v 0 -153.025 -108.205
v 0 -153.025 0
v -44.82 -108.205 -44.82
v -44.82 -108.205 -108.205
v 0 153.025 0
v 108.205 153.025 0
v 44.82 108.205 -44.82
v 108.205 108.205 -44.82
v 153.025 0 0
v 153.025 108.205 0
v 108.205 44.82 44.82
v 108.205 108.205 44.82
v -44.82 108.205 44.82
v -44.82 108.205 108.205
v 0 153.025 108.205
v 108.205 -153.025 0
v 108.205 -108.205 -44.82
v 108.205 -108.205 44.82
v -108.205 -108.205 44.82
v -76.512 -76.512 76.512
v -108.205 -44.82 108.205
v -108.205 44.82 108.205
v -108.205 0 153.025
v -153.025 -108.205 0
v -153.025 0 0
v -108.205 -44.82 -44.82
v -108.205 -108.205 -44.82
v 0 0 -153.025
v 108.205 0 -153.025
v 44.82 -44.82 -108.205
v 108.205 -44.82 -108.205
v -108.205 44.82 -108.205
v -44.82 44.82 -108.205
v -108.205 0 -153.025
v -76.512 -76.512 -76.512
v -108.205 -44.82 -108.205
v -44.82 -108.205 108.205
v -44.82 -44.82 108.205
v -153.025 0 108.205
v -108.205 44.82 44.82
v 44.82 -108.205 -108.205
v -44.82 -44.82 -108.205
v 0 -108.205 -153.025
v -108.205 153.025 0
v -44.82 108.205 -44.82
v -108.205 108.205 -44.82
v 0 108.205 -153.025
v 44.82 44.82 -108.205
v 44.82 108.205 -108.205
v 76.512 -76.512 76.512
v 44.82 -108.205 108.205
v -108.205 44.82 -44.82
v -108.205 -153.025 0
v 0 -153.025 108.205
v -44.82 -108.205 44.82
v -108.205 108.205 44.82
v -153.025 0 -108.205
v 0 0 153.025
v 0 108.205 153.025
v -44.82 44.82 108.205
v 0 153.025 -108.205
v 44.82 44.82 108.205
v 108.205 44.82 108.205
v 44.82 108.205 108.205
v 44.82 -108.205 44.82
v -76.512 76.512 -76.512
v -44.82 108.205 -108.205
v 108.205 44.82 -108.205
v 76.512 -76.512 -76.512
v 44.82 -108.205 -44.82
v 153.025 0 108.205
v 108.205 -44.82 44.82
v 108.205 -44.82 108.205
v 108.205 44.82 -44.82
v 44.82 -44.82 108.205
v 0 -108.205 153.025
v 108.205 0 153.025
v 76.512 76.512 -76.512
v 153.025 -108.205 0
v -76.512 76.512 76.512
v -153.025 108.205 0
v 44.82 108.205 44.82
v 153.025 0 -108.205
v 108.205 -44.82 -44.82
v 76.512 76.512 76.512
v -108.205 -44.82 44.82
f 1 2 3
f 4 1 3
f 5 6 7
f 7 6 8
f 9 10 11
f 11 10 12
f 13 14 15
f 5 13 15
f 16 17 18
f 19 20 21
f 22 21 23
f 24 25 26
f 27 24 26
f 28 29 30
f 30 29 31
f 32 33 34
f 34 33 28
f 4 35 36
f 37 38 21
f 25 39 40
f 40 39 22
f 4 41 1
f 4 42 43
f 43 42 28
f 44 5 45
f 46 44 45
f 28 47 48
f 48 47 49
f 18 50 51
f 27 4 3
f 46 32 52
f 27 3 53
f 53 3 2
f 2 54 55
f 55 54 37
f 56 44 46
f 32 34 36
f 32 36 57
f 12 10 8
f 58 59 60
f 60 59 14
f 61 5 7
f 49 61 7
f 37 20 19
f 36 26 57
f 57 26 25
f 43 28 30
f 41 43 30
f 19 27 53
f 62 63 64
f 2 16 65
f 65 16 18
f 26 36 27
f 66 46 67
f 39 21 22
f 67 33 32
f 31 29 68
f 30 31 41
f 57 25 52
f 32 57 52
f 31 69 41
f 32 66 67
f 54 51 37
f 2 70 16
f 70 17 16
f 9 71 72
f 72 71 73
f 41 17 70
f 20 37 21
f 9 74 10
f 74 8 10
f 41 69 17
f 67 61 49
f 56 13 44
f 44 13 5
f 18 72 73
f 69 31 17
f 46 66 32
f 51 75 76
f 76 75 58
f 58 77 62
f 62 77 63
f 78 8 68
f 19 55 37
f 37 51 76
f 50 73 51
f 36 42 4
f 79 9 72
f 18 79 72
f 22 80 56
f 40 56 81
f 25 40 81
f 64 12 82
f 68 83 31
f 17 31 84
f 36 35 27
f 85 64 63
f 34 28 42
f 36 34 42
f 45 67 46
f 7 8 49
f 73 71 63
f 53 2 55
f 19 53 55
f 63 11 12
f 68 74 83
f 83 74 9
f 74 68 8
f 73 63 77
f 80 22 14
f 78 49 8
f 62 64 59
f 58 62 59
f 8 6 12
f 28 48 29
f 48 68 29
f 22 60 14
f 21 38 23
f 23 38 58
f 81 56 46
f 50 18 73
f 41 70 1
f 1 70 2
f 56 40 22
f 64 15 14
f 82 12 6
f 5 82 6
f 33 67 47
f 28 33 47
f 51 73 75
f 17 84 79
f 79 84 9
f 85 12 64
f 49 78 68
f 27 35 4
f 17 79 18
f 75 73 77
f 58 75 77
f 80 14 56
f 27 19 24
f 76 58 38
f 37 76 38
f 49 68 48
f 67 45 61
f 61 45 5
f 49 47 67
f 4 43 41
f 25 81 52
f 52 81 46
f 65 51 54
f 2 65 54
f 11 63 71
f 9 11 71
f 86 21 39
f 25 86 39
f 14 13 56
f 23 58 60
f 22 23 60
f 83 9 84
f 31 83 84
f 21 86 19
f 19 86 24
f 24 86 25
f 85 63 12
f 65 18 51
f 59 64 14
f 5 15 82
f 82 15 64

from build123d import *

# Parameters (mm, degrees)
BOSS_EXTRUDE1_DEPTH = 108.204878078
BOSS_EXTRUDE2_DEPTH = 108.204878078
BOSS_EXTRUDE3_DEPTH = 108.204878078


with BuildPart() as part:
    # Sketch3 → Boss-Extrude1 (new body, symmetric)
    with BuildSketch(Plane.XY):
        Polygon((-153.024806093, 0), (0, 153.024806093), (153.024806093, 0), (0, -153.024806093), align=None)
    extrude(amount=BOSS_EXTRUDE1_DEPTH, both=True)

    # Sketch4 → Boss-Extrude2 (add, symmetric)
    with BuildSketch(Plane(origin=(0, 0, 0), x_dir=(1, 0, 0), z_dir=(0, 1, 0))):
        Polygon((-153.024806093, 0), (0, 153.024806093), (153.024806093, 0), (0, -153.024806093), align=None)
    extrude(amount=BOSS_EXTRUDE2_DEPTH, both=True)

    # Sketch5 → Boss-Extrude3 (add, symmetric)
    with BuildSketch(Plane(origin=(0, 0, 0), x_dir=(0, 0, -1), z_dir=(1, 0, 0))):
        Polygon((-153.024806093, 0), (0, 153.024806093), (153.024806093, 0), (0, -153.024806093), align=None)
    extrude(amount=BOSS_EXTRUDE3_DEPTH, both=True)


solid = part.part
